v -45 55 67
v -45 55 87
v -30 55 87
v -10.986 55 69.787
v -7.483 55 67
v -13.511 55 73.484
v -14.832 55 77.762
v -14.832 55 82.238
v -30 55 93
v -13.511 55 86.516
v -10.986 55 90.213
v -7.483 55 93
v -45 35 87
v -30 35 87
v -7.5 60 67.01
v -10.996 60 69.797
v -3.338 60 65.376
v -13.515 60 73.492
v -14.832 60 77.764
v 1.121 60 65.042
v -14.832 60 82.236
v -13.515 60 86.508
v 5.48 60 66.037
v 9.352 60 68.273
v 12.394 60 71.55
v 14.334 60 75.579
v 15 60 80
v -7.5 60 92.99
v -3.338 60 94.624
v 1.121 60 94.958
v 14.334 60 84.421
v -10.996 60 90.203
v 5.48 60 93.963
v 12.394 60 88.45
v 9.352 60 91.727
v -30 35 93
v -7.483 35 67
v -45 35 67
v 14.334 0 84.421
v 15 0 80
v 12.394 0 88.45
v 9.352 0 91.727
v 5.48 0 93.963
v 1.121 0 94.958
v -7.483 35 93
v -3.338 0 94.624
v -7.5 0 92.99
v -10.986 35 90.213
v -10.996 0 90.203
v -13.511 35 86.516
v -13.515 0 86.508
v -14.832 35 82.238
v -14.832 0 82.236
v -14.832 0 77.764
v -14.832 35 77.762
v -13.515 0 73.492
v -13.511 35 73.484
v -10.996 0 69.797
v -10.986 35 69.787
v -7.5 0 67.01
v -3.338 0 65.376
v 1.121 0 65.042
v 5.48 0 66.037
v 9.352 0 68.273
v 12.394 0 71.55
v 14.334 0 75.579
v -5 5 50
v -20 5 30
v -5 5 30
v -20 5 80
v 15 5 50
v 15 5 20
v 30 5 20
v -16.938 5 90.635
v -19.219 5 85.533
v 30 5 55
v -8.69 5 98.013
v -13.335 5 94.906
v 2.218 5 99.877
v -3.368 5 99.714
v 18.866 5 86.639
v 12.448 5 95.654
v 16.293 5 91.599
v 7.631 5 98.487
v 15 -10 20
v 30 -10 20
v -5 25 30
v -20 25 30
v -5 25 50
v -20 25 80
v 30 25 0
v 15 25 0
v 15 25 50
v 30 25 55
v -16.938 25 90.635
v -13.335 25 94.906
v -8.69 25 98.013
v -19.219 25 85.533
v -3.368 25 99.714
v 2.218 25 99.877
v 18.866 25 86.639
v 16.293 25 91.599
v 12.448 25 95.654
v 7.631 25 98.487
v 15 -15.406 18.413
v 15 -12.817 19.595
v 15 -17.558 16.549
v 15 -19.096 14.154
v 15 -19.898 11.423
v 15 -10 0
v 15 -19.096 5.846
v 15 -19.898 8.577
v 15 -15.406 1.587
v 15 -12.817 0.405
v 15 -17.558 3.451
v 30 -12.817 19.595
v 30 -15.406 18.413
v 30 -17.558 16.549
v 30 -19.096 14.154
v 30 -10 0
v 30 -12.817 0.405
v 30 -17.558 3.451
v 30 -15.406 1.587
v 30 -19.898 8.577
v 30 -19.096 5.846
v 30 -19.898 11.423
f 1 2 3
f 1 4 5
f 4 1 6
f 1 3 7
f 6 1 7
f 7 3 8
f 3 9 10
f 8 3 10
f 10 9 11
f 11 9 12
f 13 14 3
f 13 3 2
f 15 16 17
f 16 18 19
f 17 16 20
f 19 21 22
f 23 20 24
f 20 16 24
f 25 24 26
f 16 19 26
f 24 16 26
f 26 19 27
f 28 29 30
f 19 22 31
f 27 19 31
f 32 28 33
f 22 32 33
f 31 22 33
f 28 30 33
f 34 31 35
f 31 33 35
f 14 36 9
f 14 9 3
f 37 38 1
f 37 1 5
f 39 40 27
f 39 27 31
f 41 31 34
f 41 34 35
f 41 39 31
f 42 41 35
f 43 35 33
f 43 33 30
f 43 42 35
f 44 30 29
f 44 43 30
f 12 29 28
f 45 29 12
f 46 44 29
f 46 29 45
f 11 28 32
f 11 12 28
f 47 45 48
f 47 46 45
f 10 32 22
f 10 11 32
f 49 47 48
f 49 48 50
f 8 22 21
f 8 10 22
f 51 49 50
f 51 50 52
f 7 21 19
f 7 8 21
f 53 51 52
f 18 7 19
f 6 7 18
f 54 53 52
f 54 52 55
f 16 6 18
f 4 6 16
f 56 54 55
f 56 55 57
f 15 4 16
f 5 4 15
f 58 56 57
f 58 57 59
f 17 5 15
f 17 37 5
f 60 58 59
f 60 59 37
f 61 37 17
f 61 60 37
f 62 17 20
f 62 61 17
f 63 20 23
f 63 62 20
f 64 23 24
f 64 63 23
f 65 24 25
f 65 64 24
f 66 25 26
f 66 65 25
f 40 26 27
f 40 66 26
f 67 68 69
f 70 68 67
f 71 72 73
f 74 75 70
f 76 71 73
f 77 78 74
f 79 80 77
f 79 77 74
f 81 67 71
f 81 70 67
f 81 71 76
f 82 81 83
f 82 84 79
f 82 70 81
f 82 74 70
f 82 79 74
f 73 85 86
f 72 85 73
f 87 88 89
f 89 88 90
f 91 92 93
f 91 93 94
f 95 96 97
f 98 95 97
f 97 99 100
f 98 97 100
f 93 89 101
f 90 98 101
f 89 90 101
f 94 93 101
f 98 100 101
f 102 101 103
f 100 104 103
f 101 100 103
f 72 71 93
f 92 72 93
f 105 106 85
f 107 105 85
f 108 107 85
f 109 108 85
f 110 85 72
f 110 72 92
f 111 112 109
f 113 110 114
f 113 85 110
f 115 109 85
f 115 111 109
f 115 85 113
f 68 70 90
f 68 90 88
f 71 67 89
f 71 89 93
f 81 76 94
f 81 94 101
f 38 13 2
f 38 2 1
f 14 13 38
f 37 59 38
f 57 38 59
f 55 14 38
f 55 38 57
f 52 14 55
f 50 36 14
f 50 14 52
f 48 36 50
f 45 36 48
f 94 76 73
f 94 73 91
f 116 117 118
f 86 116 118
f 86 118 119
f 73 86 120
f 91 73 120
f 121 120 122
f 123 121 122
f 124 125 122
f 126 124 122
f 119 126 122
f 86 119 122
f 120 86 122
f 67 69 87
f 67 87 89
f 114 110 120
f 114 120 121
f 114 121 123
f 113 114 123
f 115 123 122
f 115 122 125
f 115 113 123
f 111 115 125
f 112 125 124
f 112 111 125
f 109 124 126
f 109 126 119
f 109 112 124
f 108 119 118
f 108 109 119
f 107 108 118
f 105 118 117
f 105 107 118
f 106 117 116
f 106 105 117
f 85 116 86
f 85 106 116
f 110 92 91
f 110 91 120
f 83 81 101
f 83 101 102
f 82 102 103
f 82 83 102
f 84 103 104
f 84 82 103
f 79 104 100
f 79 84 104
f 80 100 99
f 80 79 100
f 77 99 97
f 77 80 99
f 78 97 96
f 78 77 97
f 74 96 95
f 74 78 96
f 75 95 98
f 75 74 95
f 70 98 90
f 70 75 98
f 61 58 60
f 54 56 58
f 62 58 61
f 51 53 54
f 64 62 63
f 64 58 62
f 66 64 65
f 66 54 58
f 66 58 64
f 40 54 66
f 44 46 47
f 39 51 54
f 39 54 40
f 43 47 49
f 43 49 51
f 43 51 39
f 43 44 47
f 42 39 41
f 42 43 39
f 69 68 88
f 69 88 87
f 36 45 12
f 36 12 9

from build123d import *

# Parameters (mm, degrees)
PAD001_DEPTH = 20
SKETCH_R     = 15
PAD_DEPTH    = 60
PAD002_DEPTH = 20
PAD003_DEPTH = 15


with BuildPart() as pad001:
    # Sketch001 → Pad001 (new body)
    with BuildSketch(Plane.XZ.offset(-35)):
        Polygon((0, 93), (-30, 93), (-30, 87), (-45, 87), (-45, 67), (0, 67), align=None)
    extrude(amount=-PAD001_DEPTH)


with BuildPart() as fusion:
    # Sketch → Pad (new body)
    with BuildSketch(Plane.XZ):
        with Locations((0, 80)):
            Circle(SKETCH_R)
    extrude(amount=-PAD_DEPTH)

    # Fusion: union Pad001
    add(pad001.part)


with BuildPart() as pad003:
    # Sketch002 → Pad002 (new body)
    with BuildSketch(Plane.XZ.offset(-5)):
        with BuildLine():
            Line((-20, 79.999966), (-20, 30))
            Line((-20, 30), (-5, 30))
            Line((-5, 30), (-5, 50))
            Line((-5, 50), (15, 50))
            Line((15, 50), (15, 0))
            Line((15, 0), (30, 0))
            Line((30, 0), (30, 55))
            Line((30, 55), (18.865919, 86.63906))
            ThreePointArc((18.865919, 86.63906), (-3.367629, 99.714438), (-20, 79.999966))
        make_face()
    extrude(amount=-PAD002_DEPTH)

    # Sketch003 → Pad003 (new body)
    with BuildSketch(Plane(origin=(15, 5, 0), x_dir=(0, 0, -1), z_dir=(-1, 0, 0))):
        with BuildLine():
            Line((-20, 15.000024), (-20, 0))
            Line((-20, 0), (0, 0))
            Line((0, 0), (0, 15.000024))
            ThreePointArc((0, 15.000024), (-10, 25), (-20, 15.000024))
        make_face()
    extrude(amount=-PAD003_DEPTH)


solid = Compound([fusion.part, pad003.part])
